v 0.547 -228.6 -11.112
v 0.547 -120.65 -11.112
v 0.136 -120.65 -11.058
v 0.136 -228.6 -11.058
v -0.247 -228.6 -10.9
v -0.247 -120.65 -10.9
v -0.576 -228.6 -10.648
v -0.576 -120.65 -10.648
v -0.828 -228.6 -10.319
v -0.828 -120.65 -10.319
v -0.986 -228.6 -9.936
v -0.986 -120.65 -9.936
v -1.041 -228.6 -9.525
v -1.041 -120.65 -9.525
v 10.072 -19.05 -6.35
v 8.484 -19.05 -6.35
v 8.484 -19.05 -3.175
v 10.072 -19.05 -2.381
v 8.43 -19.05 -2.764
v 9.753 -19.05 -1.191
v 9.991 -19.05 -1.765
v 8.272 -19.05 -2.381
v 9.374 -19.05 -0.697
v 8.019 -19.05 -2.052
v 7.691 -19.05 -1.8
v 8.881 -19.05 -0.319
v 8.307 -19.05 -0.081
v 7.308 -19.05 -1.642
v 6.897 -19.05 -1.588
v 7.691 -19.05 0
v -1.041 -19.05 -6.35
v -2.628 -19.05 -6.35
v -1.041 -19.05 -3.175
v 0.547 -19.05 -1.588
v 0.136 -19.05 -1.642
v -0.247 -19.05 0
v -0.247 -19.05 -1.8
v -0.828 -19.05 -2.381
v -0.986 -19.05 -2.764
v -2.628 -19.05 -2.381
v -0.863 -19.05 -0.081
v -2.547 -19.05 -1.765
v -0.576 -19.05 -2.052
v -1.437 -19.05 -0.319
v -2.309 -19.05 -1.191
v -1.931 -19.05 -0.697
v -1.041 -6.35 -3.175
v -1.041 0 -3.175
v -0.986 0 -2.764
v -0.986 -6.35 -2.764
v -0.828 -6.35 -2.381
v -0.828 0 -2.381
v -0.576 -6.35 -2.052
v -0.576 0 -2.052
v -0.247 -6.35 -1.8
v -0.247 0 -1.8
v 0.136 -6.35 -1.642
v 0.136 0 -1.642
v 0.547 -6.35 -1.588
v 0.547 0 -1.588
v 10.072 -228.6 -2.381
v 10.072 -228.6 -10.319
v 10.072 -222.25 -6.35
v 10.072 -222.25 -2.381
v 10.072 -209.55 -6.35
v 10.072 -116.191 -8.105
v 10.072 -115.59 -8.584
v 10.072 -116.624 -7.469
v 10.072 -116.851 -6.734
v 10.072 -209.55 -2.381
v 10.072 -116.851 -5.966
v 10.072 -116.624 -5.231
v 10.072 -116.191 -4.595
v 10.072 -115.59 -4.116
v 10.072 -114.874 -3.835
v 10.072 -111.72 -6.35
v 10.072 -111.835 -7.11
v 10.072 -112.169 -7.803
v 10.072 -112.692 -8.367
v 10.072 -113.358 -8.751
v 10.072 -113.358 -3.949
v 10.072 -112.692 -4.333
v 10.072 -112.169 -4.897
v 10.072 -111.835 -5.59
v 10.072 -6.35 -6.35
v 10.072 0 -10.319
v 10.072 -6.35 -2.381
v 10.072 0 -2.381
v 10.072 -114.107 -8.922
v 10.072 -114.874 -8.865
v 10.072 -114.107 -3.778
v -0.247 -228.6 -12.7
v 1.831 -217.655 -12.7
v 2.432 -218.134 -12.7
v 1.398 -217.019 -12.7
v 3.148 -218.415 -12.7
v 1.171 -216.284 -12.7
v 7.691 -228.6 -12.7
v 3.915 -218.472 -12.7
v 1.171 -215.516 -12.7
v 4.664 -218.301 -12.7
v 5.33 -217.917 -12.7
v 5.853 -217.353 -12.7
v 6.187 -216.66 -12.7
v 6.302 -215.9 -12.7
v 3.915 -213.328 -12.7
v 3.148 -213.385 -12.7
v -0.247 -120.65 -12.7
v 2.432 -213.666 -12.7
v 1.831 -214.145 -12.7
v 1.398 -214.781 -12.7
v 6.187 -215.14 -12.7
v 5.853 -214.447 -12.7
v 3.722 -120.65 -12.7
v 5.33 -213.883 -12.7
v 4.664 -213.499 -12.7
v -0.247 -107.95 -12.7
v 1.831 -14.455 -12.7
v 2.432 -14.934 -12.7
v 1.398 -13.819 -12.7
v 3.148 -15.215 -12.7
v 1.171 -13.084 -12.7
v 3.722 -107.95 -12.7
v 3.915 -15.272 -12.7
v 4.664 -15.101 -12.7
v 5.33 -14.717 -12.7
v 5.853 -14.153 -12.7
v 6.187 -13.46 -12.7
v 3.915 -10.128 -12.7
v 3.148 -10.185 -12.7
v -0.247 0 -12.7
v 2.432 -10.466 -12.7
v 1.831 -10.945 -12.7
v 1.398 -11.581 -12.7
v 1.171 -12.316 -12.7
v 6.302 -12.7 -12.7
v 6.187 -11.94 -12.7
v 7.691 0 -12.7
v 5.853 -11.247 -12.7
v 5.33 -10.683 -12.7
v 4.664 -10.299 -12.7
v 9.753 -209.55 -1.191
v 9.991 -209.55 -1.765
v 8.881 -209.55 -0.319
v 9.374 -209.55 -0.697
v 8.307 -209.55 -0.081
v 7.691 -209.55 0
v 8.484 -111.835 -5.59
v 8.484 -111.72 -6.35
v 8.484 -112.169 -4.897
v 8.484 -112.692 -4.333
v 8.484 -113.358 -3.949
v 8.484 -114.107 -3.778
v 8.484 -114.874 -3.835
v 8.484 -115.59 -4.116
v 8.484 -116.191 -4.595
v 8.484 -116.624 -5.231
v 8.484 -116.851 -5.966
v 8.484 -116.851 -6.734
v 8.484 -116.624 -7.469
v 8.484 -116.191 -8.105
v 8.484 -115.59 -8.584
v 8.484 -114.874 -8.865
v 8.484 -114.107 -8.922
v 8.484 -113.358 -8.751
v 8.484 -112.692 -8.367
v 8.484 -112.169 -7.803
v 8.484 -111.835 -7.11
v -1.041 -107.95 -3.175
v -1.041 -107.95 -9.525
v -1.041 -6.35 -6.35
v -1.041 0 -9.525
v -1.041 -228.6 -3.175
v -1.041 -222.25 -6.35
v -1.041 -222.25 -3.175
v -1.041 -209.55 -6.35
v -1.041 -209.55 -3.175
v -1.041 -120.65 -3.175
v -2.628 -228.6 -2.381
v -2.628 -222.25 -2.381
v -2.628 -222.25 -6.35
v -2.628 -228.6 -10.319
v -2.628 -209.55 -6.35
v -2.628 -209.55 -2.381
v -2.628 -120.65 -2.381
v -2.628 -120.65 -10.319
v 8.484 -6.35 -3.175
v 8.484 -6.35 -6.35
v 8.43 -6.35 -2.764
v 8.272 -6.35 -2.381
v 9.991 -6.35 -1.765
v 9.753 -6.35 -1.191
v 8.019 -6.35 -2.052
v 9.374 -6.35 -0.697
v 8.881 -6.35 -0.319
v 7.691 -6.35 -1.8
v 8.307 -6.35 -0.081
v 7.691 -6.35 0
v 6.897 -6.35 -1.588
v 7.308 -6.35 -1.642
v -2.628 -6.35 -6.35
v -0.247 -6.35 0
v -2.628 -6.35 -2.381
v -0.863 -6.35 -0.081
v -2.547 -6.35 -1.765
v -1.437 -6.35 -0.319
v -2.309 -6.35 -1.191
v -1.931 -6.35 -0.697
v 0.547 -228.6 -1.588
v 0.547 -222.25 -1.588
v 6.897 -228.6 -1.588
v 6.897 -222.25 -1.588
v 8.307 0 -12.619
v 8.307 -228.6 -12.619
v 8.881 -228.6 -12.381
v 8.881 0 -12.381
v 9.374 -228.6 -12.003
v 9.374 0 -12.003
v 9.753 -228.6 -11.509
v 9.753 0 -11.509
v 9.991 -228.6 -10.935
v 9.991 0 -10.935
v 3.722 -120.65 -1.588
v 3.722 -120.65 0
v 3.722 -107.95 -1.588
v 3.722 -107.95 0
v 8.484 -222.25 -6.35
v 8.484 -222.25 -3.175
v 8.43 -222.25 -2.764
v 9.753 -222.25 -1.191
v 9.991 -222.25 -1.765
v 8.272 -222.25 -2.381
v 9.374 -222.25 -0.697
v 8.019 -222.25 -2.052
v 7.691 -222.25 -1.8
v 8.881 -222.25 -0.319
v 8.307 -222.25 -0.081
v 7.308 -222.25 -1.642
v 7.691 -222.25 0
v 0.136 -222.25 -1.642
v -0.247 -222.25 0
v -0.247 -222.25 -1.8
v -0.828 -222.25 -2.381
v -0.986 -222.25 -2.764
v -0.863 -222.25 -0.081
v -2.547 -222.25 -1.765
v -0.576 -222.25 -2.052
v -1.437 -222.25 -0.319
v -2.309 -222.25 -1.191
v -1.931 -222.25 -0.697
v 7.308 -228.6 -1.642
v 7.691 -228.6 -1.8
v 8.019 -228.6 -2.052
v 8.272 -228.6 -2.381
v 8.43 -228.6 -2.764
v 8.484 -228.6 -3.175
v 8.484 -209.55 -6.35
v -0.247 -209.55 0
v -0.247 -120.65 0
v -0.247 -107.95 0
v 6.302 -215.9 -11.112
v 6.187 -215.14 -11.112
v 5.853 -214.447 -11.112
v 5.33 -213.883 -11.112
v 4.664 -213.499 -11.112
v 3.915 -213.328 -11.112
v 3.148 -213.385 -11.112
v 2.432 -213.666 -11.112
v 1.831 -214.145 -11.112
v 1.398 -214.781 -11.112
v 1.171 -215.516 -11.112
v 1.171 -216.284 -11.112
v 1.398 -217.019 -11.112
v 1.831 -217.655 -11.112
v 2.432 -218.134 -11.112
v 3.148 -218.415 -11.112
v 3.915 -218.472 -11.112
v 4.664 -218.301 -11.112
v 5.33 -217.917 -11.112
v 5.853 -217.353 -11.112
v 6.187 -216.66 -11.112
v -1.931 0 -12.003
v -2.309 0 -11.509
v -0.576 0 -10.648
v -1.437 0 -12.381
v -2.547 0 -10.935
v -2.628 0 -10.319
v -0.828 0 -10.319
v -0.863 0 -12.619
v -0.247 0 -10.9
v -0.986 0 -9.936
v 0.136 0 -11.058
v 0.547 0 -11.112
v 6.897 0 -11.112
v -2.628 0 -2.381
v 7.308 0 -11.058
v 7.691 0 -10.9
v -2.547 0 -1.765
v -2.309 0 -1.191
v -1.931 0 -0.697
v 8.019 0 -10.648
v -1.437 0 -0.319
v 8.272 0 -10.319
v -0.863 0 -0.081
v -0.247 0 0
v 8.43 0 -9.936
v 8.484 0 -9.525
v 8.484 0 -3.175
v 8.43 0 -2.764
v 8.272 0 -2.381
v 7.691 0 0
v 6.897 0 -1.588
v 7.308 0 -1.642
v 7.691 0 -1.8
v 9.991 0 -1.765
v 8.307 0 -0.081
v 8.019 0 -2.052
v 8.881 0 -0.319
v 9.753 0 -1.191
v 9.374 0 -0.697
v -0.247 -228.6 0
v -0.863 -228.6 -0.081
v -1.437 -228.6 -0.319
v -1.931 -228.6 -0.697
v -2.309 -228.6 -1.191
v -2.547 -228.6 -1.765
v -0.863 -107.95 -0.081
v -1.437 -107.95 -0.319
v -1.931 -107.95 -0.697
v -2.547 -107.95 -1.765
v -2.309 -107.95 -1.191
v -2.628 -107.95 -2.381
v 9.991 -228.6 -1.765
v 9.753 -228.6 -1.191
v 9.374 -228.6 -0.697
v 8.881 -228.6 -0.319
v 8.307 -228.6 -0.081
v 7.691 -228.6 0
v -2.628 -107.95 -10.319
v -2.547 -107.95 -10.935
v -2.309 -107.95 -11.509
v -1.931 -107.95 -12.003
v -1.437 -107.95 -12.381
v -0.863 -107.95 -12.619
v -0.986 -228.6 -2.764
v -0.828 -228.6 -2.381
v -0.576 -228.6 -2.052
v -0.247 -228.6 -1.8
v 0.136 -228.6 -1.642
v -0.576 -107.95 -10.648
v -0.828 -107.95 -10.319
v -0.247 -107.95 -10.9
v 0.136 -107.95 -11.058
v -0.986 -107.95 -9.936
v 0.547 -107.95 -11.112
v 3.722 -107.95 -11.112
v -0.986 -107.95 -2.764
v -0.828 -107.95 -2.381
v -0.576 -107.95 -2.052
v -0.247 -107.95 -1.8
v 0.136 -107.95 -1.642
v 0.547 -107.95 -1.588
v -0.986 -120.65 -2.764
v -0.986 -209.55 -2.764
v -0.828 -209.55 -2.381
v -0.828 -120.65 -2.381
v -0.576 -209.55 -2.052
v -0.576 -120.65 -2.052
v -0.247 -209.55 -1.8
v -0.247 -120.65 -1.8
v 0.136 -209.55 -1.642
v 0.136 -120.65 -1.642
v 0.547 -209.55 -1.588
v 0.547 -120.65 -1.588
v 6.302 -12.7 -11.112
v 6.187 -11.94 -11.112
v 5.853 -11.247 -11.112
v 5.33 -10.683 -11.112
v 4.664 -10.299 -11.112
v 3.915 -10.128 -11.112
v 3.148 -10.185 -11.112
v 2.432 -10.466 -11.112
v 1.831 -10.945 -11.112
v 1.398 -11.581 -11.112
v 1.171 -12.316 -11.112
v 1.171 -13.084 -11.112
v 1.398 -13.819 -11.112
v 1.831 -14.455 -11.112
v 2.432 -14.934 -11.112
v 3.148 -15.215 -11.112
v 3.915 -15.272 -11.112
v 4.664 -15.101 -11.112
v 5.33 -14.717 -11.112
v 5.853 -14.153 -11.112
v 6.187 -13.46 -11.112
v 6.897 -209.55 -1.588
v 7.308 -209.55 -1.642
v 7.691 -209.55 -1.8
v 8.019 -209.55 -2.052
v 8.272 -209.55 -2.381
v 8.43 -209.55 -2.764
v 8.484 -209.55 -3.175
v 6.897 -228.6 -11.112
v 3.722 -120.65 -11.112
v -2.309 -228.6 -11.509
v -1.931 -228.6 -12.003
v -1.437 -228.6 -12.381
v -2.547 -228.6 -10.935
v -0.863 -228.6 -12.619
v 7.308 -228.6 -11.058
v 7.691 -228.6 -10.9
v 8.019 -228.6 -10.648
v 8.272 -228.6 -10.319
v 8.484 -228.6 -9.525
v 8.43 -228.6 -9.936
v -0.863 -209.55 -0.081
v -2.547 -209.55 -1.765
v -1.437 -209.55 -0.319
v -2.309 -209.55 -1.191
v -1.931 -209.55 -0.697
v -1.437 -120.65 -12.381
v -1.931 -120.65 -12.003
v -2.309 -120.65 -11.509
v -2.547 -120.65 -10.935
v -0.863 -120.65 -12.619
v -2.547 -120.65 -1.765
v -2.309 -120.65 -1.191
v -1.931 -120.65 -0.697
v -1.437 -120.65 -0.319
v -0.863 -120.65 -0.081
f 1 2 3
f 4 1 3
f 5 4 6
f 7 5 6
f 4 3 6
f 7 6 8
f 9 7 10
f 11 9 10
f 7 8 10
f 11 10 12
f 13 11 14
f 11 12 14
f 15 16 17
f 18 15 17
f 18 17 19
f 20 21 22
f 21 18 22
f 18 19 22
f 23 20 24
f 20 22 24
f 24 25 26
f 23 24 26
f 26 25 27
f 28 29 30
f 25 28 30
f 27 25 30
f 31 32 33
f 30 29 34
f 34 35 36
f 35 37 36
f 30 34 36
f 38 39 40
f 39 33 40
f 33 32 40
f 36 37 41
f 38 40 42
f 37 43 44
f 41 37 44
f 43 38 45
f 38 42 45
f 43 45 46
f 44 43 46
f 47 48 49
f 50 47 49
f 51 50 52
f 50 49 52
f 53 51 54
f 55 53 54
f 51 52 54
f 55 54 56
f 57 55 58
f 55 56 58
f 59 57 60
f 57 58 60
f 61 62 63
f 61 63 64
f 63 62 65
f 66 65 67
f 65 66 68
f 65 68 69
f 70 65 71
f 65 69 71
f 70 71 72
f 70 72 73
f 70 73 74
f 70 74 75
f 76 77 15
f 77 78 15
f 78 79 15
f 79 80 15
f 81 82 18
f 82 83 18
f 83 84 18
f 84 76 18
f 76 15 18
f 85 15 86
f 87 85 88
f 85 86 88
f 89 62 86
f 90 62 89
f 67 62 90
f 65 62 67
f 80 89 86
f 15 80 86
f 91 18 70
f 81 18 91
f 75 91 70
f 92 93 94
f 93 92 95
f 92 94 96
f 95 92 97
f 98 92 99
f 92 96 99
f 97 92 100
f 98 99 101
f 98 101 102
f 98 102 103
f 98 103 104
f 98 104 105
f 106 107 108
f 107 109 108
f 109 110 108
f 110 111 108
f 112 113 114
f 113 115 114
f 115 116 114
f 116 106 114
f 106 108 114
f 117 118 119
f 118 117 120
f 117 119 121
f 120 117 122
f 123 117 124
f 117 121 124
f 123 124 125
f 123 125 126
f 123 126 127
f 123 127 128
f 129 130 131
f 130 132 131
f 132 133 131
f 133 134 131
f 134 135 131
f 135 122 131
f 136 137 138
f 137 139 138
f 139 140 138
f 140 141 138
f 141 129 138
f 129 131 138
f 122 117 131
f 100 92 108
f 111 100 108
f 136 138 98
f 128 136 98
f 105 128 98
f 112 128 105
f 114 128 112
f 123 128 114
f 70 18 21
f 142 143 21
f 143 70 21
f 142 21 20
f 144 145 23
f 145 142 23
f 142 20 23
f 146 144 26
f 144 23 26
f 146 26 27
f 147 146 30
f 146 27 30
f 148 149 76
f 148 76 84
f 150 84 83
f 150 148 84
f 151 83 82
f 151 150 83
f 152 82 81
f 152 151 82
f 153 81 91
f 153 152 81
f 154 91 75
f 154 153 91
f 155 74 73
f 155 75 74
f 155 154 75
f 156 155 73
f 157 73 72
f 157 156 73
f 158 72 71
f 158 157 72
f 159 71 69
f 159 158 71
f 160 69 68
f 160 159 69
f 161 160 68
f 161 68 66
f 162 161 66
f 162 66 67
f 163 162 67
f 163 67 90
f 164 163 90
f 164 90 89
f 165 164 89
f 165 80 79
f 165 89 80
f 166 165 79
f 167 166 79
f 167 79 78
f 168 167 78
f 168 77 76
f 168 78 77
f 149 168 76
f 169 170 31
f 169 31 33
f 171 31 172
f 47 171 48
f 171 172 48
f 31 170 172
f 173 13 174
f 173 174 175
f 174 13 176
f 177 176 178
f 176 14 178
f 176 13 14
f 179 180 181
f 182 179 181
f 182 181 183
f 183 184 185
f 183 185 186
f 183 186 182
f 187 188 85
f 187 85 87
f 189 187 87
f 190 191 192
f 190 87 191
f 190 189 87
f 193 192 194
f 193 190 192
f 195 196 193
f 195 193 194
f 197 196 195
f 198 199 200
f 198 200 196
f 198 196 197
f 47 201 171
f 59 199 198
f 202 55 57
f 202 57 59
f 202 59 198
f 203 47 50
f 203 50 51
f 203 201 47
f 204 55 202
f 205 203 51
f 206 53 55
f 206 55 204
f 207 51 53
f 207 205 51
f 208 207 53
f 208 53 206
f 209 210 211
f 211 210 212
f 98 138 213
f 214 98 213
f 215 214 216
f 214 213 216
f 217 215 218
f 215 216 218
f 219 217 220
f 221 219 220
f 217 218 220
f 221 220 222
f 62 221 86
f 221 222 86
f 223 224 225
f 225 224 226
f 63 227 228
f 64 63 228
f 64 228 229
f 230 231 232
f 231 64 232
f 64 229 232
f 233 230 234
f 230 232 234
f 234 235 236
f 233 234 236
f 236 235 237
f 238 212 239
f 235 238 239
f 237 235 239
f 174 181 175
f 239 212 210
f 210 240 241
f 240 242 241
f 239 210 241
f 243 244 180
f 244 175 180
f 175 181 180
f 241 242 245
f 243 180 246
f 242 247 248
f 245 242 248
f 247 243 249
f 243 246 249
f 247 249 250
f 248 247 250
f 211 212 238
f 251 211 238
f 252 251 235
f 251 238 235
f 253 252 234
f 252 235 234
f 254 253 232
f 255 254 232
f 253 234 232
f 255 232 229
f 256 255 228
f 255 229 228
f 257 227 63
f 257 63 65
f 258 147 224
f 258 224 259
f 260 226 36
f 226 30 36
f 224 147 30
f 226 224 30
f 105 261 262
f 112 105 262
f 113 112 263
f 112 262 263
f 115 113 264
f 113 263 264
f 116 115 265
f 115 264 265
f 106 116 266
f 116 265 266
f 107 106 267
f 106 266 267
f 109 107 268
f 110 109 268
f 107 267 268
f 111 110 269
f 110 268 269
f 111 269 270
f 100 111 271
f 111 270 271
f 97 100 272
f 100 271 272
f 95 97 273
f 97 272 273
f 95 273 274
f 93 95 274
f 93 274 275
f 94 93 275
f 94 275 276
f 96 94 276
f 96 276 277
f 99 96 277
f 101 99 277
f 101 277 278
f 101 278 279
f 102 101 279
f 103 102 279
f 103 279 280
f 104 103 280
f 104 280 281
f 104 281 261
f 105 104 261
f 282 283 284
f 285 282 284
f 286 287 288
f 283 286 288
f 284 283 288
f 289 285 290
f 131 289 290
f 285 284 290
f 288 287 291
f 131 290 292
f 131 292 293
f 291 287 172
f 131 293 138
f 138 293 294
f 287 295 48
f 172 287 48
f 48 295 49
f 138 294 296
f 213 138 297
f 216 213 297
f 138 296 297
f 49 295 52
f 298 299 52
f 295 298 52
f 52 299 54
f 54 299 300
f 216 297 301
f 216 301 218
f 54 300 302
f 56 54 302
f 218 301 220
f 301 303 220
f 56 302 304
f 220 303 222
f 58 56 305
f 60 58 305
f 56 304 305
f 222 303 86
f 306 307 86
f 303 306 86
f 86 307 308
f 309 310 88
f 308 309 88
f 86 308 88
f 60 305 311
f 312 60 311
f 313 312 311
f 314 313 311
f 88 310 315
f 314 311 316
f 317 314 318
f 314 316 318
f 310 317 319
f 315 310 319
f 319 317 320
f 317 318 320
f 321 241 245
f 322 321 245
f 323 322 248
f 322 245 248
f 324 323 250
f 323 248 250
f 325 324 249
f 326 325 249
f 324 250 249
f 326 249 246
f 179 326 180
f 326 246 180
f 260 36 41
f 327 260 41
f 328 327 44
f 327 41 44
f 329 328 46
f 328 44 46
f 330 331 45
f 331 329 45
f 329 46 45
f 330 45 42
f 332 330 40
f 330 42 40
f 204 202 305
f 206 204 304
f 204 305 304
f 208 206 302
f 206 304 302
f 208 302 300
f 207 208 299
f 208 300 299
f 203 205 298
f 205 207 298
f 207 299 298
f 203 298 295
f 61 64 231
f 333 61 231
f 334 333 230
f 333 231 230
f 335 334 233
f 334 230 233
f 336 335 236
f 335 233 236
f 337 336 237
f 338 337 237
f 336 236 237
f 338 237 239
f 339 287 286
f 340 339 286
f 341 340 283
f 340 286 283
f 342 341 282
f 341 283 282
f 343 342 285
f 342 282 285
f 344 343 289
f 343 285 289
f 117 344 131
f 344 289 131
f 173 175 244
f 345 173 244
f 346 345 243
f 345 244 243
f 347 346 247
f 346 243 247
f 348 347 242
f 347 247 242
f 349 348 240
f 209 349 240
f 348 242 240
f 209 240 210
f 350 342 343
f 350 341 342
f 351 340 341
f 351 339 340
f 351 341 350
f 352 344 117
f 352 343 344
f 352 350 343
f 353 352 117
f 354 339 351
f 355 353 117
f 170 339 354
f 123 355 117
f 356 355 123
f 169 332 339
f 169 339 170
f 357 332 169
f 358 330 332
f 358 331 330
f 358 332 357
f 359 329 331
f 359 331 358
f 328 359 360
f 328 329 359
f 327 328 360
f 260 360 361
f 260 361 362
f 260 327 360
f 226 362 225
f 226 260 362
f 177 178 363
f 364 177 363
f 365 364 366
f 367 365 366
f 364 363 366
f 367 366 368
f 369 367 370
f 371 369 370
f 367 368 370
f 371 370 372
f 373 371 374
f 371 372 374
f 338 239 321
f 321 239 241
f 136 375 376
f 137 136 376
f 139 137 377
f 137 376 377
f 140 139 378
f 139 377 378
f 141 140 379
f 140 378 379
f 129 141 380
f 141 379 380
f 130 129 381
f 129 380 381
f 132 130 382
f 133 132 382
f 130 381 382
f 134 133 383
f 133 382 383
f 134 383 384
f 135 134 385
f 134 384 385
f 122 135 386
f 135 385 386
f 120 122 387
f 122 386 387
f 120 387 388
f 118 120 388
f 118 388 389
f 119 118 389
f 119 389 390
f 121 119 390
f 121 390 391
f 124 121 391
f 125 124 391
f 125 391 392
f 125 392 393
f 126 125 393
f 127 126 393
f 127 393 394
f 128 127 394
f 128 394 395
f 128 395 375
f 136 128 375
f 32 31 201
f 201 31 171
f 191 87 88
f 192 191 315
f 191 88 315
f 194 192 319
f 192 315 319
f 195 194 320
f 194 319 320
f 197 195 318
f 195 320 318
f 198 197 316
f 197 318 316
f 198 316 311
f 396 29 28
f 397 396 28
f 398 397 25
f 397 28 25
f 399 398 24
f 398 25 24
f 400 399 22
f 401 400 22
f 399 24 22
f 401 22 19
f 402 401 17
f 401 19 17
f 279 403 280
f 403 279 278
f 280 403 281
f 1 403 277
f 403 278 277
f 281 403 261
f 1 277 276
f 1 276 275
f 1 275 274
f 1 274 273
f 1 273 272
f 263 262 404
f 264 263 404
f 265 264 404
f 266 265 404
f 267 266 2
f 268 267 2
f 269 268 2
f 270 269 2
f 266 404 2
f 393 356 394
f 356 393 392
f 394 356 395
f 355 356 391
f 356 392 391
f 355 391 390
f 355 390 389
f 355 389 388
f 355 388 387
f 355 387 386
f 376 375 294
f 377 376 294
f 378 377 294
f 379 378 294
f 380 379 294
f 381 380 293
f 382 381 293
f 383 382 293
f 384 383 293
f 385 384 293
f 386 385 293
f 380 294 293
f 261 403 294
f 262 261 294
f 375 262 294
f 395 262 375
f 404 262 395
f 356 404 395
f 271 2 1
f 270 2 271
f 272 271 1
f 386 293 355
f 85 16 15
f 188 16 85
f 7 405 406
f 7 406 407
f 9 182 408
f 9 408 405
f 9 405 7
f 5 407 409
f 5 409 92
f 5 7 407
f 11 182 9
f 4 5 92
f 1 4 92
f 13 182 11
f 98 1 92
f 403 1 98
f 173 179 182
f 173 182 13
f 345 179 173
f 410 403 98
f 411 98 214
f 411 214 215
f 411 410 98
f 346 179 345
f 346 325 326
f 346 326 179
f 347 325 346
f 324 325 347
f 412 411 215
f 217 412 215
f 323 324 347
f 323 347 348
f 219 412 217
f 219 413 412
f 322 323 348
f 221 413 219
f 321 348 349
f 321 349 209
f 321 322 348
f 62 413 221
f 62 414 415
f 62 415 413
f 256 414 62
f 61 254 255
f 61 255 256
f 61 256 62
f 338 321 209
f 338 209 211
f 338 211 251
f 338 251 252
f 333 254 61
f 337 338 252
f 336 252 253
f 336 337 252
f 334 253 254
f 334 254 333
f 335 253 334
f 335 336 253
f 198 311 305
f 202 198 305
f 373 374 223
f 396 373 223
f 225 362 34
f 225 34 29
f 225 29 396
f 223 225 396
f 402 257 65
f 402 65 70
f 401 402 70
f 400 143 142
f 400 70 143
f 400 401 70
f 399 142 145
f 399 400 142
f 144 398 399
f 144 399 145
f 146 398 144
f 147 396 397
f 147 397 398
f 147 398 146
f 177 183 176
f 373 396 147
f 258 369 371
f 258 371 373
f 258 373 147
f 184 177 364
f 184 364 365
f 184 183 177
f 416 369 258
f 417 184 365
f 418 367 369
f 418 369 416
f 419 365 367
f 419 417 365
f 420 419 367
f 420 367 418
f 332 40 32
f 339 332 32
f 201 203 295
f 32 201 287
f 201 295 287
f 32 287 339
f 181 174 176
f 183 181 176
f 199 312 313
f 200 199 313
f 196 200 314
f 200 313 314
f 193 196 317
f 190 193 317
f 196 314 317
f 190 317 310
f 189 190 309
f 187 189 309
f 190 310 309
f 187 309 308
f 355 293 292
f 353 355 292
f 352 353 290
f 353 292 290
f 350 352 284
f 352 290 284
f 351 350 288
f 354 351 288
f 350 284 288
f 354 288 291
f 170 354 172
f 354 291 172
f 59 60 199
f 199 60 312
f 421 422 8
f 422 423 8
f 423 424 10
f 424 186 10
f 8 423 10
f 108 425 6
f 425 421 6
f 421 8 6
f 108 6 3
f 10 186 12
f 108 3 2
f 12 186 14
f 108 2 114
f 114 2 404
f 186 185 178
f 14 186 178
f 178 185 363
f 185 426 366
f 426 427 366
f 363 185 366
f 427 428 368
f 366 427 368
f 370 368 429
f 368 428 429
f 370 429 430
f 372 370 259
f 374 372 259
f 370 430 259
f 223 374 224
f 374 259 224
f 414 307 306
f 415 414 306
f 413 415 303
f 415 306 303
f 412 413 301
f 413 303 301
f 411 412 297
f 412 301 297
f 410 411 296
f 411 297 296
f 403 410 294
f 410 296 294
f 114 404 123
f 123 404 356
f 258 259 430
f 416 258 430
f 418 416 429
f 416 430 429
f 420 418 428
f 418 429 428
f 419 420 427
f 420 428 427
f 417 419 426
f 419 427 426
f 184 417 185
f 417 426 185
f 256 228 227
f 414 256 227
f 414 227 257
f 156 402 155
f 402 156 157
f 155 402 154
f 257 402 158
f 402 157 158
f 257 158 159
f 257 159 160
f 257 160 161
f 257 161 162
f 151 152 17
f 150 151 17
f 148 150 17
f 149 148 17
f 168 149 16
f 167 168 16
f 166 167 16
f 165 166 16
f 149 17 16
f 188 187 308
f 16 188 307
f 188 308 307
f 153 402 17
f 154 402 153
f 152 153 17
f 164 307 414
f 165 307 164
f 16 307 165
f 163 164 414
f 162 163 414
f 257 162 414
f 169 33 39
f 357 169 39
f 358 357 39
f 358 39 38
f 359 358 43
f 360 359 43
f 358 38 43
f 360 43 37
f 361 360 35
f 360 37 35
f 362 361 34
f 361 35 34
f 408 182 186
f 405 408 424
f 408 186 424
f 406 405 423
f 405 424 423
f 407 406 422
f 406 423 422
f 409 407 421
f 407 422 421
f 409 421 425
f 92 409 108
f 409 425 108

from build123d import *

# Parameters (mm, degrees)
F1_DEPTH      = 228.6
F2_W          = 12.7
F2_H          = 6.35
F3_DEPTH      = 11.938
F3_DEPTH_BACK = 25.4
F4_W          = 6.35
F4_H          = 12.7
F5_DEPTH      = 12.7
F6_R          = 2.579688
F7_DEPTH      = 12.7
F8_R          = 2.579688
F9_DEPTH      = 12.7


with BuildPart() as f1:
    # F0 (on Front) → F1 (new body)
    with BuildSketch(Plane.XZ):
        with BuildLine():
            ThreePointArc((10.071912, -2.38125), (9.37446, -0.697452), (7.690662, 0))
            Line((7.690662, 0), (-0.246838, 0))
            ThreePointArc((-0.246838, 0), (-1.930636, -0.697452), (-2.628088, -2.38125))
            Line((-2.628088, -2.38125), (-2.628088, -10.31875))
            ThreePointArc((-2.628088, -10.31875), (-1.930636, -12.002548), (-0.246838, -12.7))
            Line((-0.246838, -12.7), (7.690662, -12.7))
            ThreePointArc((7.690662, -12.7), (9.37446, -12.002548), (10.071912, -10.31875))
            Line((10.071912, -10.31875), (10.071912, -2.38125))
        make_face()
        with BuildLine():
            Line((0.546912, -1.5875), (6.896912, -1.5875))
            ThreePointArc((6.896912, -1.5875), (8.019444, -2.052468), (8.484412, -3.175))
            Line((8.484412, -3.175), (8.484412, -9.525))
            ThreePointArc((8.484412, -9.525), (8.019444, -10.647532), (6.896912, -11.1125))
            Line((6.896912, -11.1125), (0.546912, -11.1125))
            ThreePointArc((0.546912, -11.1125), (-0.57562, -10.647532), (-1.040588, -9.525))
            Line((-1.040588, -9.525), (-1.040588, -3.175))
            ThreePointArc((-1.040588, -3.175), (-0.57562, -2.052468), (0.546912, -1.5875))
        make_face(mode=Mode.SUBTRACT)
    extrude(amount=F1_DEPTH)

    # F2 (on Right) → F3 (cut, two sides)
    with BuildSketch(Plane.YZ) as f3_sk:
        with Locations((-215.9, -3.175)):
            Rectangle(F2_W, F2_H)
        with Locations((-12.7, -3.175)):
            Rectangle(F2_W, F2_H)
    extrude(amount=F3_DEPTH, mode=Mode.SUBTRACT)
    extrude(f3_sk.sketch, amount=-F3_DEPTH_BACK, mode=Mode.SUBTRACT)

    # F4 (on Top) → F5 (cut)
    with BuildSketch(Plane.XY):
        with Locations((0.546912, -114.3)):
            Rectangle(F4_W, F4_H)
    extrude(amount=-F5_DEPTH, mode=Mode.SUBTRACT)

    # F6 (on Top) → F7 (cut)
    with BuildSketch(Plane.XY):
        with Locations((3.721912, -12.7)):
            Circle(F6_R)
        with Locations((3.721912, -215.9)):
            Circle(F6_R)
    extrude(amount=-F7_DEPTH, mode=Mode.SUBTRACT)

    # F8 (on Right) → F9 (cut)
    with BuildSketch(Plane.YZ):
        with Locations((-114.3, -6.35)):
            Circle(F8_R)
    extrude(amount=F9_DEPTH, mode=Mode.SUBTRACT)


solid = f1.part
